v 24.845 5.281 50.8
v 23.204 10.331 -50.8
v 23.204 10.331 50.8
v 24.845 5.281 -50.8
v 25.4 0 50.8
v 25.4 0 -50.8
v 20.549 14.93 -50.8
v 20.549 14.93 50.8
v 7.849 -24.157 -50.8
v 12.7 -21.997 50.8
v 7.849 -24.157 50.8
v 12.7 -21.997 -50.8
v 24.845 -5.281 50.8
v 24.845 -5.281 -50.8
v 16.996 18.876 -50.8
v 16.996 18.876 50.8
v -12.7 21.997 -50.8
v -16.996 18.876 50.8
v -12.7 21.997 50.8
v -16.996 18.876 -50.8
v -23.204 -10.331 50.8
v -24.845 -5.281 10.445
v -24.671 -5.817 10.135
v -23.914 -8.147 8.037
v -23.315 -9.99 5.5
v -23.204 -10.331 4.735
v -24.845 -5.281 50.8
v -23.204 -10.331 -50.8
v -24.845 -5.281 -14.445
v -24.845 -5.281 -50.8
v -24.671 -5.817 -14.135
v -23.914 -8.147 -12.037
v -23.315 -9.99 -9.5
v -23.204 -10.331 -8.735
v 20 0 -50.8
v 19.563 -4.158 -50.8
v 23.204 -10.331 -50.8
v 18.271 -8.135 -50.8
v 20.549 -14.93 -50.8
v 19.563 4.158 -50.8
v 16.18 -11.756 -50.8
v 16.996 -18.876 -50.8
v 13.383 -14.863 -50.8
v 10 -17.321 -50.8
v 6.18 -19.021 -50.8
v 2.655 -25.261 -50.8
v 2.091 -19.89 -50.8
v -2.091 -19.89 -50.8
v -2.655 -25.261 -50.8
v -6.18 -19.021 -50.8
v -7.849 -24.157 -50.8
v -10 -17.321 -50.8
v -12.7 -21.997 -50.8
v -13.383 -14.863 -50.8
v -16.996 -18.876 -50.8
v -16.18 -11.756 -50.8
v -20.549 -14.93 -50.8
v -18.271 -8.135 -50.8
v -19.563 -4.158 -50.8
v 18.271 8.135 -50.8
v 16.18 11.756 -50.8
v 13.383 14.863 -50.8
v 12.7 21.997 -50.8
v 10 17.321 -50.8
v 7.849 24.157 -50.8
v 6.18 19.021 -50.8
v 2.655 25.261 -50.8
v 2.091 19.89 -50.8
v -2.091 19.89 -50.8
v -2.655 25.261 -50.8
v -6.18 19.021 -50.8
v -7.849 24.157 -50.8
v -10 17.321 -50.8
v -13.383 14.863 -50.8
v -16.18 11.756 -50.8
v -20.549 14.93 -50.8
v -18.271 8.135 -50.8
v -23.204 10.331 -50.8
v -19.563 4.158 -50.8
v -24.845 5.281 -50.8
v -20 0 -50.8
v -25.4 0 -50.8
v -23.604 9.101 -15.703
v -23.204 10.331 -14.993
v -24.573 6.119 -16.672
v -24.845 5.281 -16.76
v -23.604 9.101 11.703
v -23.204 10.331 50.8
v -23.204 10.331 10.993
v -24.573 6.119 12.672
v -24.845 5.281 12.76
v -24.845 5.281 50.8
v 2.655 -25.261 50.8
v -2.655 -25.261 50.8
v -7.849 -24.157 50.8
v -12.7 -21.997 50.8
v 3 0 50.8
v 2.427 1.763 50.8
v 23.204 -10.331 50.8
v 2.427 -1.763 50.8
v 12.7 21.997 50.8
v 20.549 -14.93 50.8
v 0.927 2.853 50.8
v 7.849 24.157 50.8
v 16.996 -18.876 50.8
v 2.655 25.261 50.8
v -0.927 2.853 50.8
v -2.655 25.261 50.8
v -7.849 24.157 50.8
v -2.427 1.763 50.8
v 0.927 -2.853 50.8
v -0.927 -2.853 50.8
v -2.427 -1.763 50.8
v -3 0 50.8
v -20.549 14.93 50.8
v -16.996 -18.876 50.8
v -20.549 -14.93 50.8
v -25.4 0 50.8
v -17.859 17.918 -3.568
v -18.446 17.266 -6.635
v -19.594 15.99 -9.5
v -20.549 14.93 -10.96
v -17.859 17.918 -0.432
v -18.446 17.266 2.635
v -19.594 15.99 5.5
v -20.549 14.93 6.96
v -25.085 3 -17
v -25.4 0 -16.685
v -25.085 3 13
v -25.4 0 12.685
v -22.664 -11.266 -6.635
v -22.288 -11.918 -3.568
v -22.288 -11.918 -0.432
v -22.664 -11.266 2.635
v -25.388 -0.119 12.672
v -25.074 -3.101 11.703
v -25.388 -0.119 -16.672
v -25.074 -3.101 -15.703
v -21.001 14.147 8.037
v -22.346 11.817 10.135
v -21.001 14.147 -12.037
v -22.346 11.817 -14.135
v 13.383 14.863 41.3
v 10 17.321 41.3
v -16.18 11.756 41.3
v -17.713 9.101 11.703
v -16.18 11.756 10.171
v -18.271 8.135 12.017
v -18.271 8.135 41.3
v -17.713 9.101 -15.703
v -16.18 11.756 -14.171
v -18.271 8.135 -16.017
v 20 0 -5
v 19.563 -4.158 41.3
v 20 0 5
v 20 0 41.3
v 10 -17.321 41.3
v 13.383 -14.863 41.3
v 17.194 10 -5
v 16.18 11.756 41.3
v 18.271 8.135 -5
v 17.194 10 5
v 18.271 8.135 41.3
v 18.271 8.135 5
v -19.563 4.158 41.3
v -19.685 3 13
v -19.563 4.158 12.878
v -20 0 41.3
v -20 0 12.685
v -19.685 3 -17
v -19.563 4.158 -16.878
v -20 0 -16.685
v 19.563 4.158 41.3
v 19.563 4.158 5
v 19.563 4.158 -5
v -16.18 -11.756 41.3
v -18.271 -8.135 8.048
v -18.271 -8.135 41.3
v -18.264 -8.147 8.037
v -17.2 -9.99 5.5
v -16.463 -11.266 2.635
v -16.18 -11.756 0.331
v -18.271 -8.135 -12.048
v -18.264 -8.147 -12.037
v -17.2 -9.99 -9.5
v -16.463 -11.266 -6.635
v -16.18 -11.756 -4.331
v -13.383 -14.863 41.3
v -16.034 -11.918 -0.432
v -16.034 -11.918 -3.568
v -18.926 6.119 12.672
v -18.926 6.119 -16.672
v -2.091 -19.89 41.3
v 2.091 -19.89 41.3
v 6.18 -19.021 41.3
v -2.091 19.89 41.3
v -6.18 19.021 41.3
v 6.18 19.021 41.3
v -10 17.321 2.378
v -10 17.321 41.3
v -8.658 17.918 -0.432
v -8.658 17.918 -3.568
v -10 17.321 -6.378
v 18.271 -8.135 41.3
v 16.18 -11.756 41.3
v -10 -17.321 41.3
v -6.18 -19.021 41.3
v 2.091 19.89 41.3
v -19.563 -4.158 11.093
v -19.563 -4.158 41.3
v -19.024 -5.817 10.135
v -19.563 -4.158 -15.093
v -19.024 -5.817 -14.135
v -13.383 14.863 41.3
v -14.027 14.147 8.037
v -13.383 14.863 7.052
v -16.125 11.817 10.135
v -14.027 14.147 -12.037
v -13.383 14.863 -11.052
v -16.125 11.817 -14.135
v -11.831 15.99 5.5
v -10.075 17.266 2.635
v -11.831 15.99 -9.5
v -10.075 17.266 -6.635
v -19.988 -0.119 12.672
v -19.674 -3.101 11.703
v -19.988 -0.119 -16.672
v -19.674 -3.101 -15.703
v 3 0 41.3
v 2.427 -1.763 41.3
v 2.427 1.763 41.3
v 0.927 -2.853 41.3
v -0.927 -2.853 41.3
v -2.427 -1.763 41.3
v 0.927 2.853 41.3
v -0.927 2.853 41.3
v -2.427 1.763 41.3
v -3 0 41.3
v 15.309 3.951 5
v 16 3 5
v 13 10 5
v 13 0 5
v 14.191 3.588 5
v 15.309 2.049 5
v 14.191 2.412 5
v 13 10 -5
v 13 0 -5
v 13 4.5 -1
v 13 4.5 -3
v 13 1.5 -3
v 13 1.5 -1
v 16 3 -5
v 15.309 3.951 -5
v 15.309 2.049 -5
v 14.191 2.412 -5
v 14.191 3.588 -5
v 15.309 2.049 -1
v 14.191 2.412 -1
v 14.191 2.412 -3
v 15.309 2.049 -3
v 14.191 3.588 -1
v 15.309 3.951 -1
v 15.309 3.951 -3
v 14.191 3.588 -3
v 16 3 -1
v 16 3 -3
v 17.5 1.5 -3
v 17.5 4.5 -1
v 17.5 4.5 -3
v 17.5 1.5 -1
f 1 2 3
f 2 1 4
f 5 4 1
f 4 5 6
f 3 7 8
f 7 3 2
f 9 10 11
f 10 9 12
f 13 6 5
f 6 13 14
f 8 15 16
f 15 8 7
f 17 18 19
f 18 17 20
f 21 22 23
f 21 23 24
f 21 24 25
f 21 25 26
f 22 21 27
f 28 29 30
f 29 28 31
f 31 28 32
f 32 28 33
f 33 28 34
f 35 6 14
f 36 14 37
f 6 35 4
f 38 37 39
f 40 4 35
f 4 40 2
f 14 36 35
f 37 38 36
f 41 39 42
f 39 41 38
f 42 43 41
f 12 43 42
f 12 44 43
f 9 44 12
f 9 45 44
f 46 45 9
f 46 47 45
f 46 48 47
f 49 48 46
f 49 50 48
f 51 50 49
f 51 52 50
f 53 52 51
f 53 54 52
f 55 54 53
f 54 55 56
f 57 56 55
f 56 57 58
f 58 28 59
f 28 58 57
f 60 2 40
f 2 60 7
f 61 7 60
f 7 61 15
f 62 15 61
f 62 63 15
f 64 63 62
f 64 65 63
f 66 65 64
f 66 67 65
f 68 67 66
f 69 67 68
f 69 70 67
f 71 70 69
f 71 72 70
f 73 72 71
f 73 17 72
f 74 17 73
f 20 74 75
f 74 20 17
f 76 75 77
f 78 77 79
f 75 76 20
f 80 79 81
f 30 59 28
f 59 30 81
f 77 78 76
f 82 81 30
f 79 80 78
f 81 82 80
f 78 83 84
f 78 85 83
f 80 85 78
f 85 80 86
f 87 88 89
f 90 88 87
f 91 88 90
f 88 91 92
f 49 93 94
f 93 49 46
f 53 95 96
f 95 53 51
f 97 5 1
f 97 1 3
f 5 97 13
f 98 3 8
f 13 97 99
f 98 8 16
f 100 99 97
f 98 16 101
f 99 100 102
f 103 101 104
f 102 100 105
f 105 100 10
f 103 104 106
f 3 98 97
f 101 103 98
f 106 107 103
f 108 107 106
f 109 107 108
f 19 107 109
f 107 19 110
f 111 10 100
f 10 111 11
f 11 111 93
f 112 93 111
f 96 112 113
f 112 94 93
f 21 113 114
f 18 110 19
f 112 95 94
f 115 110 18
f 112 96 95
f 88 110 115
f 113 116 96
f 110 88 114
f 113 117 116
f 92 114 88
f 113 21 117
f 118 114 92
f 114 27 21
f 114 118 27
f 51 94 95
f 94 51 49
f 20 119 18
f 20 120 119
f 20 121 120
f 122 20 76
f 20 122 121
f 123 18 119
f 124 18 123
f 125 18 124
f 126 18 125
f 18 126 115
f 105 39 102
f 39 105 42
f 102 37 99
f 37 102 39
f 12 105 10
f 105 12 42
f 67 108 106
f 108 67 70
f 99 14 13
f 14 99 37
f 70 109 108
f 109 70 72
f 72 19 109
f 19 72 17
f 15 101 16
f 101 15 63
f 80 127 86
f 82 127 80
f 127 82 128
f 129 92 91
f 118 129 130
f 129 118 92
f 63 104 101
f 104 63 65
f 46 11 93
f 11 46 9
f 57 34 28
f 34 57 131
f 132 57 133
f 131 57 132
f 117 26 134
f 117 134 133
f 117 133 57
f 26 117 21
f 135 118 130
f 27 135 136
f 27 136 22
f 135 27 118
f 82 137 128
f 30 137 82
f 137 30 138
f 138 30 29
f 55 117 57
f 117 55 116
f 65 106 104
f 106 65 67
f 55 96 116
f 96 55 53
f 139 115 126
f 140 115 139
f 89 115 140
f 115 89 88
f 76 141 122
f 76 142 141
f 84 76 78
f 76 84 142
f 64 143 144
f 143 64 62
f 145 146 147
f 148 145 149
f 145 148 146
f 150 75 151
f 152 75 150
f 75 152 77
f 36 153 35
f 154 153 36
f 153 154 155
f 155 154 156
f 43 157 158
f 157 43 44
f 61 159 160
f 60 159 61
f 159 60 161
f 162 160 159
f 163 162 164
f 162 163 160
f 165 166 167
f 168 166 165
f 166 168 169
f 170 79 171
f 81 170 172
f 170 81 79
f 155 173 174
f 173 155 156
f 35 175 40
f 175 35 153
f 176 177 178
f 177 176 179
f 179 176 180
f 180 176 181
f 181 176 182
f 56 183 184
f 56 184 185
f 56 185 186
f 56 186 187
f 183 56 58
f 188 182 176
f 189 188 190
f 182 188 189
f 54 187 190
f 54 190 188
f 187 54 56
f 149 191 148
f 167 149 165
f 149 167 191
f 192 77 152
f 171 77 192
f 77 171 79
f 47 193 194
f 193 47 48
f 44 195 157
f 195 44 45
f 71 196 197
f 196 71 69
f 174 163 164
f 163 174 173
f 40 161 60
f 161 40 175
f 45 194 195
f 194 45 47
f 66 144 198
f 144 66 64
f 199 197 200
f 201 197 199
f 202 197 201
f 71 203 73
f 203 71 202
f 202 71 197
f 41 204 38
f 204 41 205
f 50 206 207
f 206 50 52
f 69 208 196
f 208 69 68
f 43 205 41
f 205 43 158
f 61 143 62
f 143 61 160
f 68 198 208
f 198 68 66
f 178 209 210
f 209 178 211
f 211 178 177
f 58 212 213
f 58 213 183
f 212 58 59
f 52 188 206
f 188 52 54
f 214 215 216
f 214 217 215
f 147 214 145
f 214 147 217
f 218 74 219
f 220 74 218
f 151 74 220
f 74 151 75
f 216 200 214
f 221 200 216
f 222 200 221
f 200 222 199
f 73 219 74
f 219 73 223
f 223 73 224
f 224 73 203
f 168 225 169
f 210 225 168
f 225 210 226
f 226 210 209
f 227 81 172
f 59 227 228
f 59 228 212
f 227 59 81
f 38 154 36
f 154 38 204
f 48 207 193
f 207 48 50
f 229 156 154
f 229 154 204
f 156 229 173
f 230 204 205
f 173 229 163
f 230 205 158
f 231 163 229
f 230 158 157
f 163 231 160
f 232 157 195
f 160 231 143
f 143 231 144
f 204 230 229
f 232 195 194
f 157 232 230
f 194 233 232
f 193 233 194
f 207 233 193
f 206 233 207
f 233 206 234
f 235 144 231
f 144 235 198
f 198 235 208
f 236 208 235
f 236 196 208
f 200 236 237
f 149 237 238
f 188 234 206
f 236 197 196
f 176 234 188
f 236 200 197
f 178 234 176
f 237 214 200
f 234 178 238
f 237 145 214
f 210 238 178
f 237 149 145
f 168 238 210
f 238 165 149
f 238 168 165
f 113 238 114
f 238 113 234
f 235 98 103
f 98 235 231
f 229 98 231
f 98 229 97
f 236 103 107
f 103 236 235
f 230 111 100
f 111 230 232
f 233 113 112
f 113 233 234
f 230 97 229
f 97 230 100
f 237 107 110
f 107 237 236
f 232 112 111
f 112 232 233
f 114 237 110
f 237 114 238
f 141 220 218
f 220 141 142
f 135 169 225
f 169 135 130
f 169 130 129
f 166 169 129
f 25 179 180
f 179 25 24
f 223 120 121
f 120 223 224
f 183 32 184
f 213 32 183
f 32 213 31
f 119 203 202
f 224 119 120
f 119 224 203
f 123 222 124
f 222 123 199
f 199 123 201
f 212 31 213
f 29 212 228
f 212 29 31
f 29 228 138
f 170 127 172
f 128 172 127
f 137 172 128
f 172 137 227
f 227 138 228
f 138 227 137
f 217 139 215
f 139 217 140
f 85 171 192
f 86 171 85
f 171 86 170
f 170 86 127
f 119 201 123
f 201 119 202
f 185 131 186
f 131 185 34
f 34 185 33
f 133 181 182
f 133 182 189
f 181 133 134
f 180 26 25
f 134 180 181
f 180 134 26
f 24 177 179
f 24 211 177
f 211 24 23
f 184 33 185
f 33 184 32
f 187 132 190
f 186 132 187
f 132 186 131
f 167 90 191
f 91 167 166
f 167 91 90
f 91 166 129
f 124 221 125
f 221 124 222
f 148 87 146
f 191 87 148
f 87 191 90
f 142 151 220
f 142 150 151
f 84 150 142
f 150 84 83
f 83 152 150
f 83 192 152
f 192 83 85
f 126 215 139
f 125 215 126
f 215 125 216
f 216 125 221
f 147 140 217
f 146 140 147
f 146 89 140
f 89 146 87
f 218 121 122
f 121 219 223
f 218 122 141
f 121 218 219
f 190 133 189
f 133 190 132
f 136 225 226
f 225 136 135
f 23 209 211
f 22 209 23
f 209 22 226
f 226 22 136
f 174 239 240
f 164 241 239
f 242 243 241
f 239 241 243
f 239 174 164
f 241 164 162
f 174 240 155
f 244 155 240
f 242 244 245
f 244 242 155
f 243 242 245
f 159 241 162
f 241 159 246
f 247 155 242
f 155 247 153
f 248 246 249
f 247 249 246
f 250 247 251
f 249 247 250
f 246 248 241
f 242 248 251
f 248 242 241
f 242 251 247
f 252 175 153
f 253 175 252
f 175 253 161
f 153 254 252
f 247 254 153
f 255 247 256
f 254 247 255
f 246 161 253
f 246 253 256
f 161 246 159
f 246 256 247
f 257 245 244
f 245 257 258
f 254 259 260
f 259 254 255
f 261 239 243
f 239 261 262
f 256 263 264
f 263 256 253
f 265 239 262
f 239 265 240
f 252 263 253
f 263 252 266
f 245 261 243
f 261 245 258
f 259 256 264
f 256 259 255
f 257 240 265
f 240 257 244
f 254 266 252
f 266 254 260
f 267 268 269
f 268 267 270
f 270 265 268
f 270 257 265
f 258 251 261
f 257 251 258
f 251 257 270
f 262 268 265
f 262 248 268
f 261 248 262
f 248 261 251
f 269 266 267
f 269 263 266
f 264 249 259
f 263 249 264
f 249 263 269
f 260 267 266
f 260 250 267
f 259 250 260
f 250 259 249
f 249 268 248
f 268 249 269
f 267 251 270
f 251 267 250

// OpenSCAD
difference() {
    cylinder(h=101.6, r=25.4, center = true);
    
        translate([0,0,-10])
        rotate([])
        cylinder(h=102.6, r= 20, center=true);
        
        translate([0,0,50])
        rotate([])
        cylinder(h=20,r=3, center=true);
    
        
                    
    translate([0,3,-2])
    rotate([0,90,180])
    cylinder(h=60, r= 15);
    

    
}
difference(){
    
    
    translate([18,5,0])
    rotate([0,0,90])
    cube(size=[10,10,10], center=true);
    
    
    translate([15,3,0])
    rotate([0,0,0])
    cylinder(h=11, r=1, center=true);
    
    translate([15,3,-2])
    rotate([])
    cube(size=[5,3,2], center=true);
    
    
    

}
